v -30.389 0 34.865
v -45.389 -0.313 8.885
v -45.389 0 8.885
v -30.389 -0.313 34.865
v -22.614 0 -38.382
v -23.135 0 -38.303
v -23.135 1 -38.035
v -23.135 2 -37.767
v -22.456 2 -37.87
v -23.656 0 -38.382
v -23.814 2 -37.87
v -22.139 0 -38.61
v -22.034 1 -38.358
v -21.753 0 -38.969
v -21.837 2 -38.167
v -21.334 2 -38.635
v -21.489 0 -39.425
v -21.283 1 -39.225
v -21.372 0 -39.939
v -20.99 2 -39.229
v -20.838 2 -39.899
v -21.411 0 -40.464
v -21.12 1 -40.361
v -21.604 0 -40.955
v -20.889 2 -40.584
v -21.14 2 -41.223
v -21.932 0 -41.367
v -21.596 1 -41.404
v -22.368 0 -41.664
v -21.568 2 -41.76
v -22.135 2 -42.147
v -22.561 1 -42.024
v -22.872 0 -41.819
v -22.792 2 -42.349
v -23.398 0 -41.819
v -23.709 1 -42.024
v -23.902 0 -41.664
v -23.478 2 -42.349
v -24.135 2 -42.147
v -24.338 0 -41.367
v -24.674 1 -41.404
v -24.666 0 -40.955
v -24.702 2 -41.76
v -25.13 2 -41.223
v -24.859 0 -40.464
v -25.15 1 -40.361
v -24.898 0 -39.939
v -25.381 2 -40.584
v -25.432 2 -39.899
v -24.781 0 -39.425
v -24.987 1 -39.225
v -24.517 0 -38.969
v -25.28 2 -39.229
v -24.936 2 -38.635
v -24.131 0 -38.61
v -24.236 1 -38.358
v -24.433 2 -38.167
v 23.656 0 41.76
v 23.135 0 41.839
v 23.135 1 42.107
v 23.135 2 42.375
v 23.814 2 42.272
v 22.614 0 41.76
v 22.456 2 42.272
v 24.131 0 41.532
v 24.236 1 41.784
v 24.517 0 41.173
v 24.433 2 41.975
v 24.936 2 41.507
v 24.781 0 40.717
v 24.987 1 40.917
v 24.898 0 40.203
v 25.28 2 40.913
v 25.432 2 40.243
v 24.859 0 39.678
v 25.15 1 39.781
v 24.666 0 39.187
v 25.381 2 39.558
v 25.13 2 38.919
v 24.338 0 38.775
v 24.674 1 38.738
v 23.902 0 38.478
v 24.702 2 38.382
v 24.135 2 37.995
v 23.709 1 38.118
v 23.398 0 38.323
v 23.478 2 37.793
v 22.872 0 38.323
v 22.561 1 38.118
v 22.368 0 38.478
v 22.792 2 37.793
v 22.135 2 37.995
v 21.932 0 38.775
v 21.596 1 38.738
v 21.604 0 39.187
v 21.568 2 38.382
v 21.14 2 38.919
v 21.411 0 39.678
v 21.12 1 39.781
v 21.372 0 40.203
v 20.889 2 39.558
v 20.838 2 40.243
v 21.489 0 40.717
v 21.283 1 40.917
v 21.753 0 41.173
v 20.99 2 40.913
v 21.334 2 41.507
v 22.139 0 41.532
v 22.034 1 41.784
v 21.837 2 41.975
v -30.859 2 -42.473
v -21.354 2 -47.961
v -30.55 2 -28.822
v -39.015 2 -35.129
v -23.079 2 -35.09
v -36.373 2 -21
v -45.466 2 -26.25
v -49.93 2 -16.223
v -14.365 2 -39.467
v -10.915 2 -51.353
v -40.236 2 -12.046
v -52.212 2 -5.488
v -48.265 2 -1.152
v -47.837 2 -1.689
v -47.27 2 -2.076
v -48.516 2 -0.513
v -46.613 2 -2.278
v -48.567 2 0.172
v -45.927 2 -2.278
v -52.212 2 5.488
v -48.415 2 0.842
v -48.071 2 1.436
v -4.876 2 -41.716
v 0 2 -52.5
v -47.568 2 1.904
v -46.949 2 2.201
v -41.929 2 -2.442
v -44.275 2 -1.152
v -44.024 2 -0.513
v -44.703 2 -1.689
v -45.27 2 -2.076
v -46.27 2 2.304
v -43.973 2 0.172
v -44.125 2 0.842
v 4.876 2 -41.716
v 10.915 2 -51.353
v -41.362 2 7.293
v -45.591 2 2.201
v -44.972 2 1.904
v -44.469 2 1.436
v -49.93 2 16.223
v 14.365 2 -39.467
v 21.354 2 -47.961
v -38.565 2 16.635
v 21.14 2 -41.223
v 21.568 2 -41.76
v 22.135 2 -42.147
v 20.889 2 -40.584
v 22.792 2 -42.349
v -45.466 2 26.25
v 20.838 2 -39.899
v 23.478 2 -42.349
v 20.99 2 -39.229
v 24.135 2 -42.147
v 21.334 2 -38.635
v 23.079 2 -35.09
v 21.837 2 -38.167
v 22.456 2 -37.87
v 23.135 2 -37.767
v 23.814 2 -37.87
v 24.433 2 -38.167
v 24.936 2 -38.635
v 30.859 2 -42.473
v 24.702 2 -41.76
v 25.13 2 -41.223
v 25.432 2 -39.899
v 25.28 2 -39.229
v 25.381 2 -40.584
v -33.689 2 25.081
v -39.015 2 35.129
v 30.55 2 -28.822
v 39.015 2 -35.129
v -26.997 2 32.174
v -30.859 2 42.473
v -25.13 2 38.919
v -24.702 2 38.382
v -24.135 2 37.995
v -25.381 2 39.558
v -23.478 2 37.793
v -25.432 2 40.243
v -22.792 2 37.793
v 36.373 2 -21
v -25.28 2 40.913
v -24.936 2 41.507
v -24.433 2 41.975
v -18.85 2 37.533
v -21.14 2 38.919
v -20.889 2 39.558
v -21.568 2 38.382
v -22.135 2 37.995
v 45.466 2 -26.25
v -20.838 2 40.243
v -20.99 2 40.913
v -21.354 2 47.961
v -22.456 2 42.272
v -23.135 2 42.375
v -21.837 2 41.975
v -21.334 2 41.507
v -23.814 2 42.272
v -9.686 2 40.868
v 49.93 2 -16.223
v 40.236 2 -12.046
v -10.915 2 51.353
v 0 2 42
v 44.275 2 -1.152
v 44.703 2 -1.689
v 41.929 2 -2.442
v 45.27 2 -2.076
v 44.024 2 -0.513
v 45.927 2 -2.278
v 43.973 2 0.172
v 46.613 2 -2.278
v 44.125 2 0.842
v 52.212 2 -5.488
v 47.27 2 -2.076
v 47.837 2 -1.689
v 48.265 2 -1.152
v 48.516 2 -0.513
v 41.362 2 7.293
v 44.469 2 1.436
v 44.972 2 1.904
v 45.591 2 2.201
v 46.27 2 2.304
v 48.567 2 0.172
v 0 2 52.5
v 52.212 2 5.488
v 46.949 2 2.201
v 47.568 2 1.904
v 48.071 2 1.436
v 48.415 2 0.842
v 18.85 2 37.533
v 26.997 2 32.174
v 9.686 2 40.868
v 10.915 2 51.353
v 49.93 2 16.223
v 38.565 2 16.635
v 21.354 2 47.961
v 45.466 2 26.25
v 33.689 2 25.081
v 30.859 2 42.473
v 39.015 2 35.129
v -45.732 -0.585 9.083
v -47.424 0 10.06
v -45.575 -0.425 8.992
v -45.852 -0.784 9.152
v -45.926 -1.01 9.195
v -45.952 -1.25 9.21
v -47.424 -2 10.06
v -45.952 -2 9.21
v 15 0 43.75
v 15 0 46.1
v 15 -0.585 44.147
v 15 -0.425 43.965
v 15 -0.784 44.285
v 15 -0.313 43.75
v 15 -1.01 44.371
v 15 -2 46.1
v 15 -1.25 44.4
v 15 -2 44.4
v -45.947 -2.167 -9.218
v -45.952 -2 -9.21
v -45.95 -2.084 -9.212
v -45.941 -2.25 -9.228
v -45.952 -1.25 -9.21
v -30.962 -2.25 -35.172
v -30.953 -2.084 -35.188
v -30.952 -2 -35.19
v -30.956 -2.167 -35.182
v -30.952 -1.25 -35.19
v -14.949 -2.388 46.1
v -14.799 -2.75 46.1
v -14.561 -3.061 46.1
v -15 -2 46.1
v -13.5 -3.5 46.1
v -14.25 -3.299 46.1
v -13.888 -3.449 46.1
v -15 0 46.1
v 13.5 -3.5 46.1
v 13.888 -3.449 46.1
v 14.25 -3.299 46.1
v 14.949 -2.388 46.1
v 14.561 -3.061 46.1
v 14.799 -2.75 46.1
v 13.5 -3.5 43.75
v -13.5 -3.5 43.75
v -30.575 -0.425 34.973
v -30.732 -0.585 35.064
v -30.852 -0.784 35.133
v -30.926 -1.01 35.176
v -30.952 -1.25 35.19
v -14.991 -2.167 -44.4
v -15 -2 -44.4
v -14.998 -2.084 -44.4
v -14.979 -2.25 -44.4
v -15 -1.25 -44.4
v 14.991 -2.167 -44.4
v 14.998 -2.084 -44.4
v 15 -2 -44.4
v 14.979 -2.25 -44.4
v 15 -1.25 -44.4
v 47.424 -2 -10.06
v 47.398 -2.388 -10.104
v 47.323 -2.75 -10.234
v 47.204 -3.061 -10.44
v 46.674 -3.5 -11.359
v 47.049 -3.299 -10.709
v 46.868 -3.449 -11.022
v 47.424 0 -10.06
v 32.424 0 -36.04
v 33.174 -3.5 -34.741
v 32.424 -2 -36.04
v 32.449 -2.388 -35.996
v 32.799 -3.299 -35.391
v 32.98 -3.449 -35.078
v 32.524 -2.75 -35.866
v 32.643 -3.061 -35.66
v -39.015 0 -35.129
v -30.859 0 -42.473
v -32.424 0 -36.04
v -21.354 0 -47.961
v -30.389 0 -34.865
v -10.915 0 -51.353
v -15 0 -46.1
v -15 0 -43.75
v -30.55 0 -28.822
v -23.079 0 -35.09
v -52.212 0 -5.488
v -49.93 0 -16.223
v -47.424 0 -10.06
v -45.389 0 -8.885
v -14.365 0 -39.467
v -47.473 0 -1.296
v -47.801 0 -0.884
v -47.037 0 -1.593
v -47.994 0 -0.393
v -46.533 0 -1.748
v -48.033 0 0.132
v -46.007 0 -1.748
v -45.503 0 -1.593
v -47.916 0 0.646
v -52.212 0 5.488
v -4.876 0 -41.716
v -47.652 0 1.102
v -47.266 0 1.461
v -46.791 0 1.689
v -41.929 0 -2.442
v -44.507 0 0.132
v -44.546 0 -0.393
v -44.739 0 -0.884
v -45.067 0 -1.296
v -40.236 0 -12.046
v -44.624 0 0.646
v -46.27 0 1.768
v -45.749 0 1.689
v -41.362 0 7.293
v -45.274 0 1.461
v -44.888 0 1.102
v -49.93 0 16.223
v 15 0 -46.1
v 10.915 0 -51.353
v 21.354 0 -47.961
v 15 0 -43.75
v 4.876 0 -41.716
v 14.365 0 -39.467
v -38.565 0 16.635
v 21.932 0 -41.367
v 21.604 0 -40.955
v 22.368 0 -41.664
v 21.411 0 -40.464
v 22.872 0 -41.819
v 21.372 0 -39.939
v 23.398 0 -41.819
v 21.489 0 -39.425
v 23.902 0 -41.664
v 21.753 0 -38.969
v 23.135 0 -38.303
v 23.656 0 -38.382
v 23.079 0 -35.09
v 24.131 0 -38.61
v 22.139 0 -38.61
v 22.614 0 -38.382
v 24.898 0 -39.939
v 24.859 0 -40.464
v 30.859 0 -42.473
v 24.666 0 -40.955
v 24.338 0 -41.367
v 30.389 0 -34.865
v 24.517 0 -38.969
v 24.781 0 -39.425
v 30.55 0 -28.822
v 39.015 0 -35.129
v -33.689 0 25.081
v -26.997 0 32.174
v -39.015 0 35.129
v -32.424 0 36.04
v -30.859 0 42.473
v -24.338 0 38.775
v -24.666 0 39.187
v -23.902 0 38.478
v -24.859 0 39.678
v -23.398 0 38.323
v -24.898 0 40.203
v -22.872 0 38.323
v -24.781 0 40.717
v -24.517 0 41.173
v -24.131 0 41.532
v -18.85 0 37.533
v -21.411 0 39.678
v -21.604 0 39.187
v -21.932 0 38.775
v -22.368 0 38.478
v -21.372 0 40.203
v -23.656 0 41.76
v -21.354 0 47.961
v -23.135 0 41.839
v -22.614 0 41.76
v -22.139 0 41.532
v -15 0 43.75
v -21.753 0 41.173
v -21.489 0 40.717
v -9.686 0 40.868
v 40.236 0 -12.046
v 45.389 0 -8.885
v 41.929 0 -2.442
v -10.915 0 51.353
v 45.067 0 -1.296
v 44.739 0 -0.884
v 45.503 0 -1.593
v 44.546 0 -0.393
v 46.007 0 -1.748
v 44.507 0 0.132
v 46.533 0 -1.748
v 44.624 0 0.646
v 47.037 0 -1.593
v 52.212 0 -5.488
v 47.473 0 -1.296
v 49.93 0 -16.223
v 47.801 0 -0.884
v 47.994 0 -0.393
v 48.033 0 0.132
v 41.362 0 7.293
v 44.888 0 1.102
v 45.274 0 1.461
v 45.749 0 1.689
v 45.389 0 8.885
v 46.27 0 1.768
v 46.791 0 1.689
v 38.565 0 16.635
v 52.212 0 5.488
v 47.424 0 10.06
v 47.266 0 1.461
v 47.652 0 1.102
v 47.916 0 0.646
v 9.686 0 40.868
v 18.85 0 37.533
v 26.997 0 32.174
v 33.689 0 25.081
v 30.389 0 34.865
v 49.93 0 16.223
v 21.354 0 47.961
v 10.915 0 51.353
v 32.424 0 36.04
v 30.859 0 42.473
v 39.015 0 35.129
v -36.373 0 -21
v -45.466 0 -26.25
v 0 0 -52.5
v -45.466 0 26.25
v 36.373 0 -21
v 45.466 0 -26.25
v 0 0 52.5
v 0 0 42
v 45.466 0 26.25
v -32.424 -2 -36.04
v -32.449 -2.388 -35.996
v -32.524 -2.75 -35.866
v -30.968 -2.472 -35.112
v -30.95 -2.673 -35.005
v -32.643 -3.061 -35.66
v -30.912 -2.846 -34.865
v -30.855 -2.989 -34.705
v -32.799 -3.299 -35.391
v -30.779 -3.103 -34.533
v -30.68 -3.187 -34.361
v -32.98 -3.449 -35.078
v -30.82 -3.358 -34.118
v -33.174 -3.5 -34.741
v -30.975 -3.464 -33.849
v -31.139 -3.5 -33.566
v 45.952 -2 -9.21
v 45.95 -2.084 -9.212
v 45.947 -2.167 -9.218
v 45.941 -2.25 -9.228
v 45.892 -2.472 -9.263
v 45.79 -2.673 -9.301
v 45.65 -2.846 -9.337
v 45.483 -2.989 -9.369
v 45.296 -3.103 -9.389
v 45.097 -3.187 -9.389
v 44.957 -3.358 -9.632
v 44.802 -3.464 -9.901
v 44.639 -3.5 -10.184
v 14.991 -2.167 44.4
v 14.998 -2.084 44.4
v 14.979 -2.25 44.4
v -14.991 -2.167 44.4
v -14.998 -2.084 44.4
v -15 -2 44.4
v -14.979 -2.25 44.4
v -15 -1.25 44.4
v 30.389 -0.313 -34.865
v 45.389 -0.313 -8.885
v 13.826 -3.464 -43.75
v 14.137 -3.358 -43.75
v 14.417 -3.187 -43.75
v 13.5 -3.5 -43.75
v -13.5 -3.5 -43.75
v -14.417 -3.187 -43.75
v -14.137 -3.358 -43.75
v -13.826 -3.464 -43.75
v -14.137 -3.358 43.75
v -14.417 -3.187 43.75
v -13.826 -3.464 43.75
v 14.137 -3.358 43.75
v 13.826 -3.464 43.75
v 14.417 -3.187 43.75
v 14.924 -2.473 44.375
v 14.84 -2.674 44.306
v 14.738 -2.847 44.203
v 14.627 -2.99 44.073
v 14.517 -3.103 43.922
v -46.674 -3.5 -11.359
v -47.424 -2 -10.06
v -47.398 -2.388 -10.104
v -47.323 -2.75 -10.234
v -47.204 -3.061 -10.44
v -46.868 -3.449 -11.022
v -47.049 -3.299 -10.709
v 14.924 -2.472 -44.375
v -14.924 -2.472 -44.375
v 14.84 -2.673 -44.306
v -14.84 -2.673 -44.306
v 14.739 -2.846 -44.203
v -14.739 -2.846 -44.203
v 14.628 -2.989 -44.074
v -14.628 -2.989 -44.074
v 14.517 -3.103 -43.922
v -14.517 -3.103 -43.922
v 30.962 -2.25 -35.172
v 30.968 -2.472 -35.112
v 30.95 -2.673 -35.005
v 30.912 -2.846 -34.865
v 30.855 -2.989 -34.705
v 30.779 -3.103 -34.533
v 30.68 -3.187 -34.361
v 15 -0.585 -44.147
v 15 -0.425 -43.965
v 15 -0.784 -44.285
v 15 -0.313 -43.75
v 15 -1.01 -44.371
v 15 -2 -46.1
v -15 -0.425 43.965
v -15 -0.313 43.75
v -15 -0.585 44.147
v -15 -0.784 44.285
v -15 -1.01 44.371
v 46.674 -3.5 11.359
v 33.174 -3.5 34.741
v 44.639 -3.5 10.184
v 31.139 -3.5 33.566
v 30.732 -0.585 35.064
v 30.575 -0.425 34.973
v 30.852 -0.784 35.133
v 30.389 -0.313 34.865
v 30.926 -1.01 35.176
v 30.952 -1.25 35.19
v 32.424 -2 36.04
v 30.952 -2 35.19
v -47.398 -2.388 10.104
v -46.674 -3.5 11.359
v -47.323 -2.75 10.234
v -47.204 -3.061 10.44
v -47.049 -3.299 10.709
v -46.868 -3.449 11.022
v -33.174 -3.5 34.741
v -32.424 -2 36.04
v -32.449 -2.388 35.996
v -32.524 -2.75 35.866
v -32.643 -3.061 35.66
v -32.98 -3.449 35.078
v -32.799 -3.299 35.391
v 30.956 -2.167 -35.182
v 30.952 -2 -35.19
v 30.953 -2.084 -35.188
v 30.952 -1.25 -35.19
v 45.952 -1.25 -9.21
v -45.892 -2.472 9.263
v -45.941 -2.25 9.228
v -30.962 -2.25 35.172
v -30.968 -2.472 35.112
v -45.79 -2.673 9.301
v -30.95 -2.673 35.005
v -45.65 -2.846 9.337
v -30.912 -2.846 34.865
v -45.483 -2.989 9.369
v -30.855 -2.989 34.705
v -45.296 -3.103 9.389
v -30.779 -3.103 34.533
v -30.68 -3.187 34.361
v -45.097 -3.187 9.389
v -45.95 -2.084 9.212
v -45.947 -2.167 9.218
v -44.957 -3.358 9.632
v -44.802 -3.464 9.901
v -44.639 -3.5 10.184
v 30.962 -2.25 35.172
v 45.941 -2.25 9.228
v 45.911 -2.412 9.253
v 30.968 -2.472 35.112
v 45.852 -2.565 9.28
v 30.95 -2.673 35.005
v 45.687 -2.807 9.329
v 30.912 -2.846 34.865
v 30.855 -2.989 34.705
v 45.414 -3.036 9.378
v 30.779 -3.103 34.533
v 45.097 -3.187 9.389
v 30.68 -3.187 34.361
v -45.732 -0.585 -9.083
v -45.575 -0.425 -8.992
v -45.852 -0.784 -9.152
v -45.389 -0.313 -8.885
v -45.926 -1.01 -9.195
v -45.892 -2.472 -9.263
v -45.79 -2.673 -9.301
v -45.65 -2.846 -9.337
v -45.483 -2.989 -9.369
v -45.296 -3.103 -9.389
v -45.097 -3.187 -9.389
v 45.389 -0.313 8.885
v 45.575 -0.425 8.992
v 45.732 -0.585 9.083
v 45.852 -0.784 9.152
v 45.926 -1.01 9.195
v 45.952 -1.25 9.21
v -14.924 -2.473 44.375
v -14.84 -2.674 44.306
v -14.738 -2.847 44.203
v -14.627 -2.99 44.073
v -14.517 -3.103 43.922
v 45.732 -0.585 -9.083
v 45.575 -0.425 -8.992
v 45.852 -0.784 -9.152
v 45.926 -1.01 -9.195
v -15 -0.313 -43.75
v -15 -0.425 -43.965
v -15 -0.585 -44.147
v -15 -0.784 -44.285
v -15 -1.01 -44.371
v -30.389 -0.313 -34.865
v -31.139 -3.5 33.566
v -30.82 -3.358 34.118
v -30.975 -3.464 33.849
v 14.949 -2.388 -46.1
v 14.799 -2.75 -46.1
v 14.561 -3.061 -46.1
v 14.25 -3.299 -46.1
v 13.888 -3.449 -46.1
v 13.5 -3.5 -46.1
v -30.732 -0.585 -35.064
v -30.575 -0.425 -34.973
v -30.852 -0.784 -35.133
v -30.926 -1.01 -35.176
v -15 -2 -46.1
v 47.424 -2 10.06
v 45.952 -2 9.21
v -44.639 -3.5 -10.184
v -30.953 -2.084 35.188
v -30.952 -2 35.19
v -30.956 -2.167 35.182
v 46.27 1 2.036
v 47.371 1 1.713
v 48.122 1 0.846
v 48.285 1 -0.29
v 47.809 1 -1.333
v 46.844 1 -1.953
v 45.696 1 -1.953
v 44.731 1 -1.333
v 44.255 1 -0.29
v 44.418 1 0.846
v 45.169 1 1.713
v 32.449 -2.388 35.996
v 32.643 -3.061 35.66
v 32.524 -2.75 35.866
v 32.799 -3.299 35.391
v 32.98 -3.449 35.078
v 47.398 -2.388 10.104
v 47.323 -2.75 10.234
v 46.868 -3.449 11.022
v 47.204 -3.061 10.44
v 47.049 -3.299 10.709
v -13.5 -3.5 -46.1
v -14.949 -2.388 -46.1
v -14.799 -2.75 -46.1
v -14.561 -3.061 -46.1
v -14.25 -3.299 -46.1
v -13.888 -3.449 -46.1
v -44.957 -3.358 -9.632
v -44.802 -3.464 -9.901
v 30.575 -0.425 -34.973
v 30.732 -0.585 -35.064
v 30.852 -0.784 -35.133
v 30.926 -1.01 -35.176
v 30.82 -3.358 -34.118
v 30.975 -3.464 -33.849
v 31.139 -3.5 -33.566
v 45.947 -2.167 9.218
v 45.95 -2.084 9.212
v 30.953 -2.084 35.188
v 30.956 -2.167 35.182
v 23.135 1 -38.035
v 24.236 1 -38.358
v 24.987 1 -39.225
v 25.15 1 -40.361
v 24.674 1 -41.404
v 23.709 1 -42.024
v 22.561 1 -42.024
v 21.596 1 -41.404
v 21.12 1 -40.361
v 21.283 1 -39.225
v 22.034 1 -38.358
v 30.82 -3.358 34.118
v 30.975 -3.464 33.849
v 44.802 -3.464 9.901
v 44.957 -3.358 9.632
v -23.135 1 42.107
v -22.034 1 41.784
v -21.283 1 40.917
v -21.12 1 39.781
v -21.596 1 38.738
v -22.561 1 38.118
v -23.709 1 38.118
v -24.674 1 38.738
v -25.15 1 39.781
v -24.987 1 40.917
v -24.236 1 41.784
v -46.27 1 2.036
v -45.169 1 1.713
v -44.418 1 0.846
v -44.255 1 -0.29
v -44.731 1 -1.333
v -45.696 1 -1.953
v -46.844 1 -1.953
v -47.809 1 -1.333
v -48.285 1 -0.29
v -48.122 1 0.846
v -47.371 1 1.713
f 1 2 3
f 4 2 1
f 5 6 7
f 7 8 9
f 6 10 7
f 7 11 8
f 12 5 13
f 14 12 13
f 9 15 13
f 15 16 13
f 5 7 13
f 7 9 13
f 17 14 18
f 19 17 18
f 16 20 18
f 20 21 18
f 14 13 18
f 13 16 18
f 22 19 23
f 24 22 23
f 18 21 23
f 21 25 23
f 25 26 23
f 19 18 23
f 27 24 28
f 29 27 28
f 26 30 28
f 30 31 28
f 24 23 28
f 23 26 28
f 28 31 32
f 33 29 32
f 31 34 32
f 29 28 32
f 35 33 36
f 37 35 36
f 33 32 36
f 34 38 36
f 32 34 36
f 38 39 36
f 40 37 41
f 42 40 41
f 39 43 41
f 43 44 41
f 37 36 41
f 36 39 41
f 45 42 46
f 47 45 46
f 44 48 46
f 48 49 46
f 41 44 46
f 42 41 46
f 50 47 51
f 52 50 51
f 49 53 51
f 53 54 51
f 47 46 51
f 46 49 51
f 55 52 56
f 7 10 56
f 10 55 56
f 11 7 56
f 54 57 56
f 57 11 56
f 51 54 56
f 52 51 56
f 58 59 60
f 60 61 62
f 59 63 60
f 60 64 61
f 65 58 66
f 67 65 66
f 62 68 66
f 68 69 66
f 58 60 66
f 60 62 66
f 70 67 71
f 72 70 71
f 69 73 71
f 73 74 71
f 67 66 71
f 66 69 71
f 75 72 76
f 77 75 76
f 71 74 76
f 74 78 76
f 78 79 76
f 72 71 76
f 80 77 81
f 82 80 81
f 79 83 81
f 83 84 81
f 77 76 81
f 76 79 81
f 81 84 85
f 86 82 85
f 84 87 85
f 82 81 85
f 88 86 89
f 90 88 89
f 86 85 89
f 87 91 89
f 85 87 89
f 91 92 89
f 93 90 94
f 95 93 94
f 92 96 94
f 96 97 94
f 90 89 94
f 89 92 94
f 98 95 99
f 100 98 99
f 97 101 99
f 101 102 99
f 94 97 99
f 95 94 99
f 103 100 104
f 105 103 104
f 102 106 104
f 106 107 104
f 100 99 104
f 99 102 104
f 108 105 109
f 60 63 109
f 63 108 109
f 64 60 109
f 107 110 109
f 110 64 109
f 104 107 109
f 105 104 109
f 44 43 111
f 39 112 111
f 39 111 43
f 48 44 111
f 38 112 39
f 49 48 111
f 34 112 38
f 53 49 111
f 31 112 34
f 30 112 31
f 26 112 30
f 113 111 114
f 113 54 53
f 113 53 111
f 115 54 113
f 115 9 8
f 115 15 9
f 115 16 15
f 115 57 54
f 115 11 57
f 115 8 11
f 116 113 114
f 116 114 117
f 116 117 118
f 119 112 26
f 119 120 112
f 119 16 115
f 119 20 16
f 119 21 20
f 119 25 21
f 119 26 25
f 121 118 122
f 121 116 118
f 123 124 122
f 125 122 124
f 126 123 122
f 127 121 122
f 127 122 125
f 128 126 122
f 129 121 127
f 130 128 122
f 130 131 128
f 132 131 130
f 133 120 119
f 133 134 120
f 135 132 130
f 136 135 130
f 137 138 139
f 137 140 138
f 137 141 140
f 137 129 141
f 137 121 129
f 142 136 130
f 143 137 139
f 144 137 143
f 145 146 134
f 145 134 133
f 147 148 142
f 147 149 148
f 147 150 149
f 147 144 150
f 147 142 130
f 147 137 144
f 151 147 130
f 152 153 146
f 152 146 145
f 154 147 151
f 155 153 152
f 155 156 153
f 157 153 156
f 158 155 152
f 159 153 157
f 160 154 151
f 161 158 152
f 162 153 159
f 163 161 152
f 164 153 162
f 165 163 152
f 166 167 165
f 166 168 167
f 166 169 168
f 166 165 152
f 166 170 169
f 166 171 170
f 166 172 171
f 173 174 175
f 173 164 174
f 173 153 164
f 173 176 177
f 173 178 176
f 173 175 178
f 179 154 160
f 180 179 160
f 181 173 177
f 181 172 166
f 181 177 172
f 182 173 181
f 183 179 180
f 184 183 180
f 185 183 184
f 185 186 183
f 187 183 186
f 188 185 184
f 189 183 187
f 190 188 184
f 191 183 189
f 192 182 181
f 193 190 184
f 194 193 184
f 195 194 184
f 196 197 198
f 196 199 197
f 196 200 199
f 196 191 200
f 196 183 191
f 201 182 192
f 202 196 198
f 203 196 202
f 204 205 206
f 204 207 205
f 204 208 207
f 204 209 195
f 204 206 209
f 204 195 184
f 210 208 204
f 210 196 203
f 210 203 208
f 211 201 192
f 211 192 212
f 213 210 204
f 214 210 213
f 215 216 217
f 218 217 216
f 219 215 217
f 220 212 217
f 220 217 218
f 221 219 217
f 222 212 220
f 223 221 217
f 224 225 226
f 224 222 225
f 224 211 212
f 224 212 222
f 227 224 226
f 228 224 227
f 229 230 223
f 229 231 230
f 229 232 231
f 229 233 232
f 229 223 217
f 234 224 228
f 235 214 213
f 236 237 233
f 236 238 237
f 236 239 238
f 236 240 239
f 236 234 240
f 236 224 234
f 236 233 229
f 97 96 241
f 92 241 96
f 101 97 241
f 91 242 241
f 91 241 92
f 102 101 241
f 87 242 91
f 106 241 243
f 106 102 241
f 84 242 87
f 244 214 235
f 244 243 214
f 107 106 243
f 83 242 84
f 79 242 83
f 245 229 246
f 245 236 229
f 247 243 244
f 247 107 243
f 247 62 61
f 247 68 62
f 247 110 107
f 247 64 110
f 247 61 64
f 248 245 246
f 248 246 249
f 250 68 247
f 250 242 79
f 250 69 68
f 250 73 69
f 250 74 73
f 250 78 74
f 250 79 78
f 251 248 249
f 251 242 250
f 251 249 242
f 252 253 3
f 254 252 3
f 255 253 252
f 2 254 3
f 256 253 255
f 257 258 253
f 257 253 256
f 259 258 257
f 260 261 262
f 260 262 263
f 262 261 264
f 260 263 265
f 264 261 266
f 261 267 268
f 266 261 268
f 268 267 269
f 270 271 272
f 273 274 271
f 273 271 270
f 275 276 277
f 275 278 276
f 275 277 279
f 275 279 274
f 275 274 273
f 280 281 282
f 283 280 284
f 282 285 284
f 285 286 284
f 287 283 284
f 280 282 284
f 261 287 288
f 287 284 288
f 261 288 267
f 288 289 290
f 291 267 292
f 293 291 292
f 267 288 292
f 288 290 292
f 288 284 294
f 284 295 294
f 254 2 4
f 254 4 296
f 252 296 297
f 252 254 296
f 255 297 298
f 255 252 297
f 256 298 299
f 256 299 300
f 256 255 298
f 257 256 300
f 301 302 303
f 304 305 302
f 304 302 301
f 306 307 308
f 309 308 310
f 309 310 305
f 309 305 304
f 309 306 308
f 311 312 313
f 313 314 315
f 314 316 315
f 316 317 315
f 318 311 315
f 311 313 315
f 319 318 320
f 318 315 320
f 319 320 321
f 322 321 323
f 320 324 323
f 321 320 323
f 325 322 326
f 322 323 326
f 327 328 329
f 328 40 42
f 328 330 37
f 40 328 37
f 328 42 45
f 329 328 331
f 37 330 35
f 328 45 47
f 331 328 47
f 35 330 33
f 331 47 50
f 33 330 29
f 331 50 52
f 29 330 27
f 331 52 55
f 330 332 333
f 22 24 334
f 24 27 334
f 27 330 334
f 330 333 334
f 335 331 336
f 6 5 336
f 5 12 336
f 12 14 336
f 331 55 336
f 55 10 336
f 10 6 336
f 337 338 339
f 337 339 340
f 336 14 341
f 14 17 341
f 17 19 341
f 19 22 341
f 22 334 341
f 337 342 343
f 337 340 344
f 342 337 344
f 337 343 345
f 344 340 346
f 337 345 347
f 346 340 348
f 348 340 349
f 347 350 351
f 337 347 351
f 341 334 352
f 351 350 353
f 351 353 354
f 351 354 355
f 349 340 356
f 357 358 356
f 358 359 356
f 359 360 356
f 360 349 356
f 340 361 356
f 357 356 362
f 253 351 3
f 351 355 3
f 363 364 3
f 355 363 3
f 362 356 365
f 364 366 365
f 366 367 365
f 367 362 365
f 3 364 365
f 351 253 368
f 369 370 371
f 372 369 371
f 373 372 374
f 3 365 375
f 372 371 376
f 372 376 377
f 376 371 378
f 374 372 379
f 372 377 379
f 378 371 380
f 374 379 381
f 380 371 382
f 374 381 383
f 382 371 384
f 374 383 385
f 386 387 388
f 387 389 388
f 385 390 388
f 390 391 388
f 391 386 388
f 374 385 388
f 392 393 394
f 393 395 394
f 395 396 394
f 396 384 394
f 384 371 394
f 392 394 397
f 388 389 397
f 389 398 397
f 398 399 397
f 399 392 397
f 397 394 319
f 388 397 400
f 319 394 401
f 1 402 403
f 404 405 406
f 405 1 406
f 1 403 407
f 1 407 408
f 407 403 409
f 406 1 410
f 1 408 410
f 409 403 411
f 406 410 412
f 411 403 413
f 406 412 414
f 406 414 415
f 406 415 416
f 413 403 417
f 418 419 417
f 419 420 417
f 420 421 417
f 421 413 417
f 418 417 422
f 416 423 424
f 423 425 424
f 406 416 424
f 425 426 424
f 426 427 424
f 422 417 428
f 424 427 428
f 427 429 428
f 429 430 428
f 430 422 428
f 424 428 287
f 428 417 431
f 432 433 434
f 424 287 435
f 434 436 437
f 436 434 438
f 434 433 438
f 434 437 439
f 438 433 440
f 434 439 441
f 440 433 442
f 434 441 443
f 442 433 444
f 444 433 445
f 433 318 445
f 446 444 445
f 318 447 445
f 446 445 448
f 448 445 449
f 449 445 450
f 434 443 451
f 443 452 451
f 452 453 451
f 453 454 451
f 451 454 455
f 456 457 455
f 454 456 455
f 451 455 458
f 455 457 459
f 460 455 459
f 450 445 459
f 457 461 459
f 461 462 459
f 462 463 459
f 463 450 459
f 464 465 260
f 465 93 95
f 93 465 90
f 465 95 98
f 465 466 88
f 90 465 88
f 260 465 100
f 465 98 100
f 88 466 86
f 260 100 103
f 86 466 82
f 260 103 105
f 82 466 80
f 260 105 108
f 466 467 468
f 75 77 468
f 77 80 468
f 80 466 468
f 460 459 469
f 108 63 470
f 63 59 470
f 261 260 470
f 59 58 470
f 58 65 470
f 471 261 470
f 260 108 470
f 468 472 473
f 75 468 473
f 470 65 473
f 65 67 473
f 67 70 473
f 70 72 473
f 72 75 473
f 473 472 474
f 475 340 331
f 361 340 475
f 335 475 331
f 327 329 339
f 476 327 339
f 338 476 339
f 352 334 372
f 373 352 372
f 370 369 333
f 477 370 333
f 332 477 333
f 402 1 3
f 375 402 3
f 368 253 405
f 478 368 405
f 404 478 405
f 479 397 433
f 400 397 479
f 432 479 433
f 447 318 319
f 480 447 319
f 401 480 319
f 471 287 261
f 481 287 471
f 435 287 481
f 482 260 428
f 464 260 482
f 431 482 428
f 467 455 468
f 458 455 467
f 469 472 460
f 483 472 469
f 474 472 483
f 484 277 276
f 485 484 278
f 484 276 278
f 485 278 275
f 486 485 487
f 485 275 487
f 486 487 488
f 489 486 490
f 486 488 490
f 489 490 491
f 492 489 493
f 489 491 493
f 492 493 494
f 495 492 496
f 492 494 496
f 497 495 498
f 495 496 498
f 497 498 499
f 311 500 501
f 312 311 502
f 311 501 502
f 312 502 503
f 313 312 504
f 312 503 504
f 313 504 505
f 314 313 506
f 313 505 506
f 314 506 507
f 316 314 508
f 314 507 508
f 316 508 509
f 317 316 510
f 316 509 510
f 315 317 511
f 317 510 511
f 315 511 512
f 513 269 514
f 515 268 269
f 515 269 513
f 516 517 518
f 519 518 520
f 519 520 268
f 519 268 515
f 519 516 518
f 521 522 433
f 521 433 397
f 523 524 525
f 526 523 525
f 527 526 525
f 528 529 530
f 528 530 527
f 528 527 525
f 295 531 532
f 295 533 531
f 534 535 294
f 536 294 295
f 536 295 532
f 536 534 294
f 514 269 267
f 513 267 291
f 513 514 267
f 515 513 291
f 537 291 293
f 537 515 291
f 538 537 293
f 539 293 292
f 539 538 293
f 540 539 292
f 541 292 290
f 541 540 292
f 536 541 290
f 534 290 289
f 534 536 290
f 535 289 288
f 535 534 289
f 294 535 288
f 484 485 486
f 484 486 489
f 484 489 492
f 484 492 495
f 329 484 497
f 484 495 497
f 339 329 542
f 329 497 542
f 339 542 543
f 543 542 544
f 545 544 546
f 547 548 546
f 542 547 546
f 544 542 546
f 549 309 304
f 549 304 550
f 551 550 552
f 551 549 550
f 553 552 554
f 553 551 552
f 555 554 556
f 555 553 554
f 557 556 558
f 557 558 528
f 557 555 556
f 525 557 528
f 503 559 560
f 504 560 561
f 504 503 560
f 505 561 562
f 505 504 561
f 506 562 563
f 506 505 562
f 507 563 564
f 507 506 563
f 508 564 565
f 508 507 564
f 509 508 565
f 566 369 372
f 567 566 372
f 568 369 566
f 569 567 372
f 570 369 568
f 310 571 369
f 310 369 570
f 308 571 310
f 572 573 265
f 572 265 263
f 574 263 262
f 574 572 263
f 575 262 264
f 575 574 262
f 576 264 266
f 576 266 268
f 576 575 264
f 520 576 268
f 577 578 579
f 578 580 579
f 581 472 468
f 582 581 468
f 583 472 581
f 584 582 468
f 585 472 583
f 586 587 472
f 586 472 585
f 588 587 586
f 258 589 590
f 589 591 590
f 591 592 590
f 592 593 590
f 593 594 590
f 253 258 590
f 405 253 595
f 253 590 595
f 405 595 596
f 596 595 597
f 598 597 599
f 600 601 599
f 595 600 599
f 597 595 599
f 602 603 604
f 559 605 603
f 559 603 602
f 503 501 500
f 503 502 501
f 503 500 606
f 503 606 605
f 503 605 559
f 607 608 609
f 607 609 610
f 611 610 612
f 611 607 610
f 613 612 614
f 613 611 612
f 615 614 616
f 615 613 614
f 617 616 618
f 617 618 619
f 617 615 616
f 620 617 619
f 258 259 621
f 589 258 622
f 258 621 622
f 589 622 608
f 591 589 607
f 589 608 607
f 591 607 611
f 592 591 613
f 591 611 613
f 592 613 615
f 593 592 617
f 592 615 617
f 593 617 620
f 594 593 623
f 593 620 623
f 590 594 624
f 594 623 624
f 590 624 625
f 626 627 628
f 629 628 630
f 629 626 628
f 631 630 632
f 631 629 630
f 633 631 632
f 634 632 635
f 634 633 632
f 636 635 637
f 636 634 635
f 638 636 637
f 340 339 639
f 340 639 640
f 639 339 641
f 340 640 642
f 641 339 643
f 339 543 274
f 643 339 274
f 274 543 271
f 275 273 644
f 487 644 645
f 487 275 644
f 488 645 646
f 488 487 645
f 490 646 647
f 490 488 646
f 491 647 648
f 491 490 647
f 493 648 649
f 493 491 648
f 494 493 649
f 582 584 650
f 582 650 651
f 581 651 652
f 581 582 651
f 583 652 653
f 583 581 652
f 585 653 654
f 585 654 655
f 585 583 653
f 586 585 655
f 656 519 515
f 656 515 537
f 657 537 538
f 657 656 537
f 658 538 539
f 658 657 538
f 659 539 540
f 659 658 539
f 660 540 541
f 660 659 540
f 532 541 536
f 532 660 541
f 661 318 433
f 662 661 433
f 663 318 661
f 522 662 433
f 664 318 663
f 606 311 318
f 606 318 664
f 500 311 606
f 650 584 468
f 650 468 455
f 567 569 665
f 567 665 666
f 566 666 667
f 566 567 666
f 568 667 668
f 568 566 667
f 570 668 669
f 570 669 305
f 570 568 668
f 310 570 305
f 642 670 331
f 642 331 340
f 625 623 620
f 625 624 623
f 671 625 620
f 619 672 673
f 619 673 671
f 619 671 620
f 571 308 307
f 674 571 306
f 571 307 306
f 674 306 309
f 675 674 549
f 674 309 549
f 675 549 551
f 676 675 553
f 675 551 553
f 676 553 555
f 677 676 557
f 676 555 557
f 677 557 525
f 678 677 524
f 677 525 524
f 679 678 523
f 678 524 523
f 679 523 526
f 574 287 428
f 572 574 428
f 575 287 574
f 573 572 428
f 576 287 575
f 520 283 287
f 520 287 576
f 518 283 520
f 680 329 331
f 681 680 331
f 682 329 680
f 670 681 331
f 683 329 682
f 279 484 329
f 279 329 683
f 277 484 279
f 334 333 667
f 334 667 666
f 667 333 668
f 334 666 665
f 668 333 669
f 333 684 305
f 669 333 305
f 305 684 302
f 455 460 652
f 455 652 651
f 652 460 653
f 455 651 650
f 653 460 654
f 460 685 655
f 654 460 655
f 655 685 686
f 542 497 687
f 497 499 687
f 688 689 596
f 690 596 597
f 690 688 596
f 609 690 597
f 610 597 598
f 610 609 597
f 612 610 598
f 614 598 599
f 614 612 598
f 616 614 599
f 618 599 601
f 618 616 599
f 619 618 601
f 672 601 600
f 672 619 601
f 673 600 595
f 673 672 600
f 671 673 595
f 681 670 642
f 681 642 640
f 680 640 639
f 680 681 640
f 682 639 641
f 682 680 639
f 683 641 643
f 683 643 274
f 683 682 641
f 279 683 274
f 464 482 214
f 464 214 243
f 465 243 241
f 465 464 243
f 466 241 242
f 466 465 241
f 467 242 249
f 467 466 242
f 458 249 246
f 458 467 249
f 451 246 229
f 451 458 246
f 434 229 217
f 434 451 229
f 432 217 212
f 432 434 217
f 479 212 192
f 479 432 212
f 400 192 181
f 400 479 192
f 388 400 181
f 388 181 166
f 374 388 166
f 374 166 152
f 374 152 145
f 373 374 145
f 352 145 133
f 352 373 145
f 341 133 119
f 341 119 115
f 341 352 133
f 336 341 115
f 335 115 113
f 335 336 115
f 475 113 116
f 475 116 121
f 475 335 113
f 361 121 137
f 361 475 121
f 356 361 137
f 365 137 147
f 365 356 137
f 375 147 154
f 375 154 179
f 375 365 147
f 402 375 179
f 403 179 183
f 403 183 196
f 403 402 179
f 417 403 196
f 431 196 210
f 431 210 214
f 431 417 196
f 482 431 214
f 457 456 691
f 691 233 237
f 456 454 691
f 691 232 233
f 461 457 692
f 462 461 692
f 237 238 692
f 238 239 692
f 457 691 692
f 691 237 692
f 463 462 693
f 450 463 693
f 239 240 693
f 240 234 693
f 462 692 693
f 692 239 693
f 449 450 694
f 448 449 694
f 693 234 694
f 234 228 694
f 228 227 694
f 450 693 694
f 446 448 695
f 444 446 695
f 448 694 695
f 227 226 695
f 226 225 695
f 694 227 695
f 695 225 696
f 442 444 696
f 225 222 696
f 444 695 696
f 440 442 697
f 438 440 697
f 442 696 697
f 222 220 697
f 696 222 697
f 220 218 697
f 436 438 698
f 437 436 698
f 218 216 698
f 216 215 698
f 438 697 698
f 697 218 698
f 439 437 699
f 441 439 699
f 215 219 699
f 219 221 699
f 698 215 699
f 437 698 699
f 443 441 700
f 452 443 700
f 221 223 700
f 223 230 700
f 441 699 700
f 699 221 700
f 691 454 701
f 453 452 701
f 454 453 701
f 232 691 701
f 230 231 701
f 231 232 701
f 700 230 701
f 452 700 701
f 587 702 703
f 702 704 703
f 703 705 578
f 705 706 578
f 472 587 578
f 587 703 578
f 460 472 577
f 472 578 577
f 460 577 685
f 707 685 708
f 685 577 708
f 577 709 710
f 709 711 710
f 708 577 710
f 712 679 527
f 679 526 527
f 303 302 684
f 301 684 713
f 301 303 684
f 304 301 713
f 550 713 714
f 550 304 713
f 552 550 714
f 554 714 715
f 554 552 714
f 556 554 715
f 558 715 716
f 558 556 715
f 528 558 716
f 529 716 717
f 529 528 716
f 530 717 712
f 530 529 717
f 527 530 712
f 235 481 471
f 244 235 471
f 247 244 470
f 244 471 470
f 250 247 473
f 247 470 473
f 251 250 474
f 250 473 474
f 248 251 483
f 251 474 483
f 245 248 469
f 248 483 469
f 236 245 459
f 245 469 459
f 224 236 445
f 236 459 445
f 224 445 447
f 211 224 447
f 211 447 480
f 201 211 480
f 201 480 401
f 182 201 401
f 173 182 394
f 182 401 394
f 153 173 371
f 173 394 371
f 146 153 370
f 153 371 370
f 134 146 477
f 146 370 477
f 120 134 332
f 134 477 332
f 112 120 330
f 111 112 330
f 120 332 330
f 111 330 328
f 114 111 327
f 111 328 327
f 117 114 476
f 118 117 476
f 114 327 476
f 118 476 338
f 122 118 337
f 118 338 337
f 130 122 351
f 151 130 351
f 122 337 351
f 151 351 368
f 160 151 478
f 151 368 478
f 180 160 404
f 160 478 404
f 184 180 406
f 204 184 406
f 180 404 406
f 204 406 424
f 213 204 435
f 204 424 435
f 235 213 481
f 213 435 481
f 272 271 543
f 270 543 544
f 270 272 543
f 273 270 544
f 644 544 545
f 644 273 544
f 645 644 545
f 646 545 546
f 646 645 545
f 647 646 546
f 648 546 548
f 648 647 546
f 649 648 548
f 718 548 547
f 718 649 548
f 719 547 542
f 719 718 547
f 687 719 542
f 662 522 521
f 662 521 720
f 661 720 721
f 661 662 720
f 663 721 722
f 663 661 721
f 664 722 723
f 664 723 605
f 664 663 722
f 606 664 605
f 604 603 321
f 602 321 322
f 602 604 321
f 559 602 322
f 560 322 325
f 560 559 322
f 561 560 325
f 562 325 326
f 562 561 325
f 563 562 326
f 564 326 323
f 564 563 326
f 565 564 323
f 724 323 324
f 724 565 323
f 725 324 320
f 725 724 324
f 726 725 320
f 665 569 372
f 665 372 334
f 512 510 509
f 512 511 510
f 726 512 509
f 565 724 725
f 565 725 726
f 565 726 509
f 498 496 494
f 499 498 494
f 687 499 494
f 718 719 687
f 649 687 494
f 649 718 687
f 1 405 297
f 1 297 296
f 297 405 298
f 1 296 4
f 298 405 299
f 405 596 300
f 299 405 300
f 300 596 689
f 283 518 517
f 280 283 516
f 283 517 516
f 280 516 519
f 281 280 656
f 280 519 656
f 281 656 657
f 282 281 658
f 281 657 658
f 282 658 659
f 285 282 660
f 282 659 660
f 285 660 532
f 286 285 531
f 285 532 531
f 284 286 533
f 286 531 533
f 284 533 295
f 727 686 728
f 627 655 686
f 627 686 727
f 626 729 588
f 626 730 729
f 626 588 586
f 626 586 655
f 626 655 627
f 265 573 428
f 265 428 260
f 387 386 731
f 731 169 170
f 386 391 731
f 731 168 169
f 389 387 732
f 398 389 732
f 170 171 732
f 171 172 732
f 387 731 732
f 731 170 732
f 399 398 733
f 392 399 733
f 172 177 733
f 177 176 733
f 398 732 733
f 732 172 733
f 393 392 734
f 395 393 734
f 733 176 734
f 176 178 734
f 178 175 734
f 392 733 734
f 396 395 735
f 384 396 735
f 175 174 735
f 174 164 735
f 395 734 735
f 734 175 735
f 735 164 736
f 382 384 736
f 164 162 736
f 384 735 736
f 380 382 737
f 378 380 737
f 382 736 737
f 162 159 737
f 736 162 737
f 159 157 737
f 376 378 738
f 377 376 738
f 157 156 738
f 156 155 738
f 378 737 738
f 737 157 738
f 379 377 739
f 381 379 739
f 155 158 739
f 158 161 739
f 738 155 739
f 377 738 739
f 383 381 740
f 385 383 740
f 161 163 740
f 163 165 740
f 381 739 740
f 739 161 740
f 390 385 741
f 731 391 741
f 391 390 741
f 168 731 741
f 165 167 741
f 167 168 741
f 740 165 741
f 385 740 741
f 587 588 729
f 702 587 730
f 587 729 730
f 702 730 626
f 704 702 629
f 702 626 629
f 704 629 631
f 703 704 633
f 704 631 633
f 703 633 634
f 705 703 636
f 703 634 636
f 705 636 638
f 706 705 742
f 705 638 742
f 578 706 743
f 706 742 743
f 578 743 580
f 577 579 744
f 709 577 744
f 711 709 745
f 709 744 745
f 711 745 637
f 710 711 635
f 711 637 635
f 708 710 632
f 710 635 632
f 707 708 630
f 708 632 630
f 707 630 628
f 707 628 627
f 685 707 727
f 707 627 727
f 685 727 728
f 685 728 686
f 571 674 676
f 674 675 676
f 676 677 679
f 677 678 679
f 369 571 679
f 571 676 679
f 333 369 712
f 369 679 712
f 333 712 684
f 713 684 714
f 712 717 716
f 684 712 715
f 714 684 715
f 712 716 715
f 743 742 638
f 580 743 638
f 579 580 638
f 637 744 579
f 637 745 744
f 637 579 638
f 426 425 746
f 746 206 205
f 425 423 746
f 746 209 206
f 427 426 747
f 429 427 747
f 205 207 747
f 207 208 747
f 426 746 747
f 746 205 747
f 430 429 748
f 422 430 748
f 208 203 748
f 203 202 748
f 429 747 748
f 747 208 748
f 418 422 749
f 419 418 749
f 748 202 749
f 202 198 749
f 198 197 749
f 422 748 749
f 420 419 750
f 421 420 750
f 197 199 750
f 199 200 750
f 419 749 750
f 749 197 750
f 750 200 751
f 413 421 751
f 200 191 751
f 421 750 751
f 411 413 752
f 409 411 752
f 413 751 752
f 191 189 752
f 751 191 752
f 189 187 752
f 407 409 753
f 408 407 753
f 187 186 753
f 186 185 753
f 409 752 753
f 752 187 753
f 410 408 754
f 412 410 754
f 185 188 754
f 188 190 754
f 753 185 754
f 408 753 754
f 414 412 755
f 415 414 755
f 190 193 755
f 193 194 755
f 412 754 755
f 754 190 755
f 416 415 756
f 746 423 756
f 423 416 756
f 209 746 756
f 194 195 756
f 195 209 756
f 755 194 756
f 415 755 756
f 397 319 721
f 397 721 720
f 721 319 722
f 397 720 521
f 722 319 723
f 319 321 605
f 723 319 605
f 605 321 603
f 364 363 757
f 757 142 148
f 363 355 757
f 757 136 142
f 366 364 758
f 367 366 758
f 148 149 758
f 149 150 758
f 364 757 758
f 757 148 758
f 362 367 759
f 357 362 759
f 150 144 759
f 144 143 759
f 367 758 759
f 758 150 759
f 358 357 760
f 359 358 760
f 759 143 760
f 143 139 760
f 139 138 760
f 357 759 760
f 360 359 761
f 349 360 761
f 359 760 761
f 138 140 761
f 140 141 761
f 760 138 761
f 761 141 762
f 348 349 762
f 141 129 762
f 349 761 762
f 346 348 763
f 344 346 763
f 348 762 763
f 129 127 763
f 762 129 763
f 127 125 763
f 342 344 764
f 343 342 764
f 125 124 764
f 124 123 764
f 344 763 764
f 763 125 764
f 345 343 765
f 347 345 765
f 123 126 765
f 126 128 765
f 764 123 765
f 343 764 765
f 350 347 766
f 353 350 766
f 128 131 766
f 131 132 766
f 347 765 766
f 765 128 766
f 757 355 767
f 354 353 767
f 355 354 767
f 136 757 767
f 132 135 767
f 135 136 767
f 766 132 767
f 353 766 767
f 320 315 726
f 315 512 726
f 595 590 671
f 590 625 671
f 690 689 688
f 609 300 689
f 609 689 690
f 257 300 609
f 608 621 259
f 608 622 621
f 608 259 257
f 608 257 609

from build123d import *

# Parameters (mm, degrees)
BOSS_EXTRUDE2_START       = -3.5
SKETCH1_W                 = 30
SKETCH1_H                 = 2.35
BOSS_EXTRUDE2_DEPTH       = 4.5
SKETCH3_R                 = 52.5
SKETCH3_R_2               = 42
SKETCH3_R_3               = 1.5
BOSS_EXTRUDE3_DEPTH       = 2
CHAMFER1_SIZE             = 3
CHAMFER1_SIZE_2           = 0.803847577
FILLET1_R                 = 1.5
F_1_0MM_START             = -15
F_1_0MM_DOWEL_SLOT1_DEPTH = 30
CIRPATTERN1_COUNT         = 6
FILLET1_OF_CIRPATTERN1_R  = 1.5


# Read off the part's stored shape, not the designer's step: Ø1.0mm Dowel Slot1
with BuildPart() as part:
    # Sketch1 → Boss-Extrude2 (new body)
    with BuildSketch(Plane(origin=(0, 0, 0), x_dir=(1, 0, 0), z_dir=(0, 1, 0)).offset(BOSS_EXTRUDE2_START)):
        with Locations((0, -44.925)):
            Rectangle(SKETCH1_W, SKETCH1_H)
    boss_extrude2 = extrude(amount=BOSS_EXTRUDE2_DEPTH)

    # Sketch3 → Boss-Extrude3 (add)
    with BuildSketch(Plane(origin=(0, 0, 0), x_dir=(1, 0, 0), z_dir=(0, 1, 0))):
        with Locations(Location((0, 0, 0), (0, 0, 270))):
            Circle(SKETCH3_R)
        with Locations(Location((0, 0, 0), (0, 0, 270))):
            Circle(SKETCH3_R_2, mode=Mode.SUBTRACT)
        with Locations(Location((-23.135, 40.070995433, 0), (0, 0, 270))):
            Circle(SKETCH3_R_3, mode=Mode.SUBTRACT)
        with Locations(Location((23.135, 40.070995433, 0), (0, 0, 270))):
            Circle(SKETCH3_R_3, mode=Mode.SUBTRACT)
        with Locations(Location((46.27, 0, 0), (0, 0, 270))):
            Circle(SKETCH3_R_3, mode=Mode.SUBTRACT)
        with Locations(Location((23.135, -40.070995433, 0), (0, 0, 270))):
            Circle(SKETCH3_R_3, mode=Mode.SUBTRACT)
        with Locations(Location((-23.135, -40.070995433, 0), (0, 0, 270))):
            Circle(SKETCH3_R_3, mode=Mode.SUBTRACT)
        with Locations(Location((-46.27, 0, 0), (0, 0, 270))):
            Circle(SKETCH3_R_3, mode=Mode.SUBTRACT)
    extrude(amount=BOSS_EXTRUDE3_DEPTH)

    # Chamfer1
    # the kernel refuses this chamfer: 3, 0.803847577 mm, written as the material it takes off along each edge
    with BuildSketch(Plane(origin=(23.135, 2, 40.070995433), x_dir=(0, 0, 1), z_dir=(-1, 0, 0))) as chamfer1_piece_1:
        Polygon((1.5, -CHAMFER1_SIZE), (1.5 + CHAMFER1_SIZE_2, 0), (1.5, 0), align=None)
    revolve(axis=Axis((23.135, 2, 40.070995433), (0, 1, 0)), mode=Mode.SUBTRACT)
    with BuildSketch(Plane(origin=(46.27, 2, 0), x_dir=(0, 0, 1), z_dir=(-1, 0, 0))) as chamfer1_piece_2:
        Polygon((1.5, -CHAMFER1_SIZE), (1.5 + CHAMFER1_SIZE_2, 0), (1.5, 0), align=None)
    revolve(axis=Axis((46.27, 2, 0), (0, 1, 0)), mode=Mode.SUBTRACT)
    with BuildSketch(Plane(origin=(23.135, 2, -40.070995433), x_dir=(0, 0, 1), z_dir=(-1, 0, 0))) as chamfer1_piece_3:
        Polygon((1.5, -CHAMFER1_SIZE), (1.5 + CHAMFER1_SIZE_2, 0), (1.5, 0), align=None)
    revolve(axis=Axis((23.135, 2, -40.070995433), (0, 1, 0)), mode=Mode.SUBTRACT)
    with BuildSketch(Plane(origin=(-23.135, 2, -40.070995433), x_dir=(0, 0, 1), z_dir=(-1, 0, 0))) as chamfer1_piece_4:
        Polygon((1.5, -CHAMFER1_SIZE), (1.5 + CHAMFER1_SIZE_2, 0), (1.5, 0), align=None)
    revolve(axis=Axis((-23.135, 2, -40.070995433), (0, 1, 0)), mode=Mode.SUBTRACT)
    with BuildSketch(Plane(origin=(-46.27, 2, 0), x_dir=(0, 0, 1), z_dir=(-1, 0, 0))) as chamfer1_piece_5:
        Polygon((1.5, -CHAMFER1_SIZE), (1.5 + CHAMFER1_SIZE_2, 0), (1.5, 0), align=None)
    revolve(axis=Axis((-46.27, 2, 0), (0, 1, 0)), mode=Mode.SUBTRACT)
    with BuildSketch(Plane(origin=(-23.135, 2, 40.070995433), x_dir=(0, 0, 1), z_dir=(-1, 0, 0))) as chamfer1_piece_6:
        Polygon((1.5, -CHAMFER1_SIZE), (1.5 + CHAMFER1_SIZE_2, 0), (1.5, 0), align=None)
    revolve(axis=Axis((-23.135, 2, 40.070995433), (0, 1, 0)), mode=Mode.SUBTRACT)

    # Fillet1
    fillet1_edges = [part.edges().sort_by_distance(p)[0] for p in [
        (-15, -3.5, 44.925),
        (15, -3.5, 44.925),
    ]]
    fillet(fillet1_edges, radius=FILLET1_R)

    # Ø1.0mm Dowel Slot1 outline → Ø1.0mm Dowel Slot1 (cut)
    with BuildSketch(Plane.YZ.offset(F_1_0MM_START)):
        with BuildLine():
            ThreePointArc((-0.3132503, 43.75), (-0.679912287, 44.221583836), (-1.25, 44.4))
            Line((-1.25, 44.4), (-2.25, 44.4))
            ThreePointArc((-2.25, 44.4), (-2.820087713, 44.221583836), (-3.1867497, 43.75))
            Line((-3.1867497, 43.75), (-0.3132503, 43.75))
        make_face()
    f_1_0mm_dowel_slot1 = extrude(amount=F_1_0MM_DOWEL_SLOT1_DEPTH, mode=Mode.SUBTRACT)

    # CirPattern1: Boss-Extrude2, Ø1.0mm Dowel Slot1 ×6 about axis
    cirpattern1_axis = Axis((0, 0, 0), (0, 1, 0))
    add([boss_extrude2.rotate(cirpattern1_axis, i * 360 / CIRPATTERN1_COUNT) for i in range(1, CIRPATTERN1_COUNT)])
    add([f_1_0mm_dowel_slot1.rotate(cirpattern1_axis, i * 360 / CIRPATTERN1_COUNT) for i in range(1, CIRPATTERN1_COUNT)], mode=Mode.SUBTRACT)

    # Fillet1 of CirPattern1
    fillet1_of_cirpattern1_edges = [part.edges().sort_by_distance(p)[0] for p in [
        (31.406191265, -3.5, 35.452881057),
        (46.406191265, -3.5, 9.472118943),
        (46.406191265, -3.5, -9.472118943),
        (31.406191265, -3.5, -35.452881057),
        (15, -3.5, -44.925),
        (-15, -3.5, -44.925),
        (-31.406191265, -3.5, -35.452881057),
        (-46.406191265, -3.5, -9.472118943),
        (-46.406191265, -3.5, 9.472118943),
        (-31.406191265, -3.5, 35.452881057),
    ]]
    fillet(fillet1_of_cirpattern1_edges, radius=FILLET1_OF_CIRPATTERN1_R)


solid = part.part
